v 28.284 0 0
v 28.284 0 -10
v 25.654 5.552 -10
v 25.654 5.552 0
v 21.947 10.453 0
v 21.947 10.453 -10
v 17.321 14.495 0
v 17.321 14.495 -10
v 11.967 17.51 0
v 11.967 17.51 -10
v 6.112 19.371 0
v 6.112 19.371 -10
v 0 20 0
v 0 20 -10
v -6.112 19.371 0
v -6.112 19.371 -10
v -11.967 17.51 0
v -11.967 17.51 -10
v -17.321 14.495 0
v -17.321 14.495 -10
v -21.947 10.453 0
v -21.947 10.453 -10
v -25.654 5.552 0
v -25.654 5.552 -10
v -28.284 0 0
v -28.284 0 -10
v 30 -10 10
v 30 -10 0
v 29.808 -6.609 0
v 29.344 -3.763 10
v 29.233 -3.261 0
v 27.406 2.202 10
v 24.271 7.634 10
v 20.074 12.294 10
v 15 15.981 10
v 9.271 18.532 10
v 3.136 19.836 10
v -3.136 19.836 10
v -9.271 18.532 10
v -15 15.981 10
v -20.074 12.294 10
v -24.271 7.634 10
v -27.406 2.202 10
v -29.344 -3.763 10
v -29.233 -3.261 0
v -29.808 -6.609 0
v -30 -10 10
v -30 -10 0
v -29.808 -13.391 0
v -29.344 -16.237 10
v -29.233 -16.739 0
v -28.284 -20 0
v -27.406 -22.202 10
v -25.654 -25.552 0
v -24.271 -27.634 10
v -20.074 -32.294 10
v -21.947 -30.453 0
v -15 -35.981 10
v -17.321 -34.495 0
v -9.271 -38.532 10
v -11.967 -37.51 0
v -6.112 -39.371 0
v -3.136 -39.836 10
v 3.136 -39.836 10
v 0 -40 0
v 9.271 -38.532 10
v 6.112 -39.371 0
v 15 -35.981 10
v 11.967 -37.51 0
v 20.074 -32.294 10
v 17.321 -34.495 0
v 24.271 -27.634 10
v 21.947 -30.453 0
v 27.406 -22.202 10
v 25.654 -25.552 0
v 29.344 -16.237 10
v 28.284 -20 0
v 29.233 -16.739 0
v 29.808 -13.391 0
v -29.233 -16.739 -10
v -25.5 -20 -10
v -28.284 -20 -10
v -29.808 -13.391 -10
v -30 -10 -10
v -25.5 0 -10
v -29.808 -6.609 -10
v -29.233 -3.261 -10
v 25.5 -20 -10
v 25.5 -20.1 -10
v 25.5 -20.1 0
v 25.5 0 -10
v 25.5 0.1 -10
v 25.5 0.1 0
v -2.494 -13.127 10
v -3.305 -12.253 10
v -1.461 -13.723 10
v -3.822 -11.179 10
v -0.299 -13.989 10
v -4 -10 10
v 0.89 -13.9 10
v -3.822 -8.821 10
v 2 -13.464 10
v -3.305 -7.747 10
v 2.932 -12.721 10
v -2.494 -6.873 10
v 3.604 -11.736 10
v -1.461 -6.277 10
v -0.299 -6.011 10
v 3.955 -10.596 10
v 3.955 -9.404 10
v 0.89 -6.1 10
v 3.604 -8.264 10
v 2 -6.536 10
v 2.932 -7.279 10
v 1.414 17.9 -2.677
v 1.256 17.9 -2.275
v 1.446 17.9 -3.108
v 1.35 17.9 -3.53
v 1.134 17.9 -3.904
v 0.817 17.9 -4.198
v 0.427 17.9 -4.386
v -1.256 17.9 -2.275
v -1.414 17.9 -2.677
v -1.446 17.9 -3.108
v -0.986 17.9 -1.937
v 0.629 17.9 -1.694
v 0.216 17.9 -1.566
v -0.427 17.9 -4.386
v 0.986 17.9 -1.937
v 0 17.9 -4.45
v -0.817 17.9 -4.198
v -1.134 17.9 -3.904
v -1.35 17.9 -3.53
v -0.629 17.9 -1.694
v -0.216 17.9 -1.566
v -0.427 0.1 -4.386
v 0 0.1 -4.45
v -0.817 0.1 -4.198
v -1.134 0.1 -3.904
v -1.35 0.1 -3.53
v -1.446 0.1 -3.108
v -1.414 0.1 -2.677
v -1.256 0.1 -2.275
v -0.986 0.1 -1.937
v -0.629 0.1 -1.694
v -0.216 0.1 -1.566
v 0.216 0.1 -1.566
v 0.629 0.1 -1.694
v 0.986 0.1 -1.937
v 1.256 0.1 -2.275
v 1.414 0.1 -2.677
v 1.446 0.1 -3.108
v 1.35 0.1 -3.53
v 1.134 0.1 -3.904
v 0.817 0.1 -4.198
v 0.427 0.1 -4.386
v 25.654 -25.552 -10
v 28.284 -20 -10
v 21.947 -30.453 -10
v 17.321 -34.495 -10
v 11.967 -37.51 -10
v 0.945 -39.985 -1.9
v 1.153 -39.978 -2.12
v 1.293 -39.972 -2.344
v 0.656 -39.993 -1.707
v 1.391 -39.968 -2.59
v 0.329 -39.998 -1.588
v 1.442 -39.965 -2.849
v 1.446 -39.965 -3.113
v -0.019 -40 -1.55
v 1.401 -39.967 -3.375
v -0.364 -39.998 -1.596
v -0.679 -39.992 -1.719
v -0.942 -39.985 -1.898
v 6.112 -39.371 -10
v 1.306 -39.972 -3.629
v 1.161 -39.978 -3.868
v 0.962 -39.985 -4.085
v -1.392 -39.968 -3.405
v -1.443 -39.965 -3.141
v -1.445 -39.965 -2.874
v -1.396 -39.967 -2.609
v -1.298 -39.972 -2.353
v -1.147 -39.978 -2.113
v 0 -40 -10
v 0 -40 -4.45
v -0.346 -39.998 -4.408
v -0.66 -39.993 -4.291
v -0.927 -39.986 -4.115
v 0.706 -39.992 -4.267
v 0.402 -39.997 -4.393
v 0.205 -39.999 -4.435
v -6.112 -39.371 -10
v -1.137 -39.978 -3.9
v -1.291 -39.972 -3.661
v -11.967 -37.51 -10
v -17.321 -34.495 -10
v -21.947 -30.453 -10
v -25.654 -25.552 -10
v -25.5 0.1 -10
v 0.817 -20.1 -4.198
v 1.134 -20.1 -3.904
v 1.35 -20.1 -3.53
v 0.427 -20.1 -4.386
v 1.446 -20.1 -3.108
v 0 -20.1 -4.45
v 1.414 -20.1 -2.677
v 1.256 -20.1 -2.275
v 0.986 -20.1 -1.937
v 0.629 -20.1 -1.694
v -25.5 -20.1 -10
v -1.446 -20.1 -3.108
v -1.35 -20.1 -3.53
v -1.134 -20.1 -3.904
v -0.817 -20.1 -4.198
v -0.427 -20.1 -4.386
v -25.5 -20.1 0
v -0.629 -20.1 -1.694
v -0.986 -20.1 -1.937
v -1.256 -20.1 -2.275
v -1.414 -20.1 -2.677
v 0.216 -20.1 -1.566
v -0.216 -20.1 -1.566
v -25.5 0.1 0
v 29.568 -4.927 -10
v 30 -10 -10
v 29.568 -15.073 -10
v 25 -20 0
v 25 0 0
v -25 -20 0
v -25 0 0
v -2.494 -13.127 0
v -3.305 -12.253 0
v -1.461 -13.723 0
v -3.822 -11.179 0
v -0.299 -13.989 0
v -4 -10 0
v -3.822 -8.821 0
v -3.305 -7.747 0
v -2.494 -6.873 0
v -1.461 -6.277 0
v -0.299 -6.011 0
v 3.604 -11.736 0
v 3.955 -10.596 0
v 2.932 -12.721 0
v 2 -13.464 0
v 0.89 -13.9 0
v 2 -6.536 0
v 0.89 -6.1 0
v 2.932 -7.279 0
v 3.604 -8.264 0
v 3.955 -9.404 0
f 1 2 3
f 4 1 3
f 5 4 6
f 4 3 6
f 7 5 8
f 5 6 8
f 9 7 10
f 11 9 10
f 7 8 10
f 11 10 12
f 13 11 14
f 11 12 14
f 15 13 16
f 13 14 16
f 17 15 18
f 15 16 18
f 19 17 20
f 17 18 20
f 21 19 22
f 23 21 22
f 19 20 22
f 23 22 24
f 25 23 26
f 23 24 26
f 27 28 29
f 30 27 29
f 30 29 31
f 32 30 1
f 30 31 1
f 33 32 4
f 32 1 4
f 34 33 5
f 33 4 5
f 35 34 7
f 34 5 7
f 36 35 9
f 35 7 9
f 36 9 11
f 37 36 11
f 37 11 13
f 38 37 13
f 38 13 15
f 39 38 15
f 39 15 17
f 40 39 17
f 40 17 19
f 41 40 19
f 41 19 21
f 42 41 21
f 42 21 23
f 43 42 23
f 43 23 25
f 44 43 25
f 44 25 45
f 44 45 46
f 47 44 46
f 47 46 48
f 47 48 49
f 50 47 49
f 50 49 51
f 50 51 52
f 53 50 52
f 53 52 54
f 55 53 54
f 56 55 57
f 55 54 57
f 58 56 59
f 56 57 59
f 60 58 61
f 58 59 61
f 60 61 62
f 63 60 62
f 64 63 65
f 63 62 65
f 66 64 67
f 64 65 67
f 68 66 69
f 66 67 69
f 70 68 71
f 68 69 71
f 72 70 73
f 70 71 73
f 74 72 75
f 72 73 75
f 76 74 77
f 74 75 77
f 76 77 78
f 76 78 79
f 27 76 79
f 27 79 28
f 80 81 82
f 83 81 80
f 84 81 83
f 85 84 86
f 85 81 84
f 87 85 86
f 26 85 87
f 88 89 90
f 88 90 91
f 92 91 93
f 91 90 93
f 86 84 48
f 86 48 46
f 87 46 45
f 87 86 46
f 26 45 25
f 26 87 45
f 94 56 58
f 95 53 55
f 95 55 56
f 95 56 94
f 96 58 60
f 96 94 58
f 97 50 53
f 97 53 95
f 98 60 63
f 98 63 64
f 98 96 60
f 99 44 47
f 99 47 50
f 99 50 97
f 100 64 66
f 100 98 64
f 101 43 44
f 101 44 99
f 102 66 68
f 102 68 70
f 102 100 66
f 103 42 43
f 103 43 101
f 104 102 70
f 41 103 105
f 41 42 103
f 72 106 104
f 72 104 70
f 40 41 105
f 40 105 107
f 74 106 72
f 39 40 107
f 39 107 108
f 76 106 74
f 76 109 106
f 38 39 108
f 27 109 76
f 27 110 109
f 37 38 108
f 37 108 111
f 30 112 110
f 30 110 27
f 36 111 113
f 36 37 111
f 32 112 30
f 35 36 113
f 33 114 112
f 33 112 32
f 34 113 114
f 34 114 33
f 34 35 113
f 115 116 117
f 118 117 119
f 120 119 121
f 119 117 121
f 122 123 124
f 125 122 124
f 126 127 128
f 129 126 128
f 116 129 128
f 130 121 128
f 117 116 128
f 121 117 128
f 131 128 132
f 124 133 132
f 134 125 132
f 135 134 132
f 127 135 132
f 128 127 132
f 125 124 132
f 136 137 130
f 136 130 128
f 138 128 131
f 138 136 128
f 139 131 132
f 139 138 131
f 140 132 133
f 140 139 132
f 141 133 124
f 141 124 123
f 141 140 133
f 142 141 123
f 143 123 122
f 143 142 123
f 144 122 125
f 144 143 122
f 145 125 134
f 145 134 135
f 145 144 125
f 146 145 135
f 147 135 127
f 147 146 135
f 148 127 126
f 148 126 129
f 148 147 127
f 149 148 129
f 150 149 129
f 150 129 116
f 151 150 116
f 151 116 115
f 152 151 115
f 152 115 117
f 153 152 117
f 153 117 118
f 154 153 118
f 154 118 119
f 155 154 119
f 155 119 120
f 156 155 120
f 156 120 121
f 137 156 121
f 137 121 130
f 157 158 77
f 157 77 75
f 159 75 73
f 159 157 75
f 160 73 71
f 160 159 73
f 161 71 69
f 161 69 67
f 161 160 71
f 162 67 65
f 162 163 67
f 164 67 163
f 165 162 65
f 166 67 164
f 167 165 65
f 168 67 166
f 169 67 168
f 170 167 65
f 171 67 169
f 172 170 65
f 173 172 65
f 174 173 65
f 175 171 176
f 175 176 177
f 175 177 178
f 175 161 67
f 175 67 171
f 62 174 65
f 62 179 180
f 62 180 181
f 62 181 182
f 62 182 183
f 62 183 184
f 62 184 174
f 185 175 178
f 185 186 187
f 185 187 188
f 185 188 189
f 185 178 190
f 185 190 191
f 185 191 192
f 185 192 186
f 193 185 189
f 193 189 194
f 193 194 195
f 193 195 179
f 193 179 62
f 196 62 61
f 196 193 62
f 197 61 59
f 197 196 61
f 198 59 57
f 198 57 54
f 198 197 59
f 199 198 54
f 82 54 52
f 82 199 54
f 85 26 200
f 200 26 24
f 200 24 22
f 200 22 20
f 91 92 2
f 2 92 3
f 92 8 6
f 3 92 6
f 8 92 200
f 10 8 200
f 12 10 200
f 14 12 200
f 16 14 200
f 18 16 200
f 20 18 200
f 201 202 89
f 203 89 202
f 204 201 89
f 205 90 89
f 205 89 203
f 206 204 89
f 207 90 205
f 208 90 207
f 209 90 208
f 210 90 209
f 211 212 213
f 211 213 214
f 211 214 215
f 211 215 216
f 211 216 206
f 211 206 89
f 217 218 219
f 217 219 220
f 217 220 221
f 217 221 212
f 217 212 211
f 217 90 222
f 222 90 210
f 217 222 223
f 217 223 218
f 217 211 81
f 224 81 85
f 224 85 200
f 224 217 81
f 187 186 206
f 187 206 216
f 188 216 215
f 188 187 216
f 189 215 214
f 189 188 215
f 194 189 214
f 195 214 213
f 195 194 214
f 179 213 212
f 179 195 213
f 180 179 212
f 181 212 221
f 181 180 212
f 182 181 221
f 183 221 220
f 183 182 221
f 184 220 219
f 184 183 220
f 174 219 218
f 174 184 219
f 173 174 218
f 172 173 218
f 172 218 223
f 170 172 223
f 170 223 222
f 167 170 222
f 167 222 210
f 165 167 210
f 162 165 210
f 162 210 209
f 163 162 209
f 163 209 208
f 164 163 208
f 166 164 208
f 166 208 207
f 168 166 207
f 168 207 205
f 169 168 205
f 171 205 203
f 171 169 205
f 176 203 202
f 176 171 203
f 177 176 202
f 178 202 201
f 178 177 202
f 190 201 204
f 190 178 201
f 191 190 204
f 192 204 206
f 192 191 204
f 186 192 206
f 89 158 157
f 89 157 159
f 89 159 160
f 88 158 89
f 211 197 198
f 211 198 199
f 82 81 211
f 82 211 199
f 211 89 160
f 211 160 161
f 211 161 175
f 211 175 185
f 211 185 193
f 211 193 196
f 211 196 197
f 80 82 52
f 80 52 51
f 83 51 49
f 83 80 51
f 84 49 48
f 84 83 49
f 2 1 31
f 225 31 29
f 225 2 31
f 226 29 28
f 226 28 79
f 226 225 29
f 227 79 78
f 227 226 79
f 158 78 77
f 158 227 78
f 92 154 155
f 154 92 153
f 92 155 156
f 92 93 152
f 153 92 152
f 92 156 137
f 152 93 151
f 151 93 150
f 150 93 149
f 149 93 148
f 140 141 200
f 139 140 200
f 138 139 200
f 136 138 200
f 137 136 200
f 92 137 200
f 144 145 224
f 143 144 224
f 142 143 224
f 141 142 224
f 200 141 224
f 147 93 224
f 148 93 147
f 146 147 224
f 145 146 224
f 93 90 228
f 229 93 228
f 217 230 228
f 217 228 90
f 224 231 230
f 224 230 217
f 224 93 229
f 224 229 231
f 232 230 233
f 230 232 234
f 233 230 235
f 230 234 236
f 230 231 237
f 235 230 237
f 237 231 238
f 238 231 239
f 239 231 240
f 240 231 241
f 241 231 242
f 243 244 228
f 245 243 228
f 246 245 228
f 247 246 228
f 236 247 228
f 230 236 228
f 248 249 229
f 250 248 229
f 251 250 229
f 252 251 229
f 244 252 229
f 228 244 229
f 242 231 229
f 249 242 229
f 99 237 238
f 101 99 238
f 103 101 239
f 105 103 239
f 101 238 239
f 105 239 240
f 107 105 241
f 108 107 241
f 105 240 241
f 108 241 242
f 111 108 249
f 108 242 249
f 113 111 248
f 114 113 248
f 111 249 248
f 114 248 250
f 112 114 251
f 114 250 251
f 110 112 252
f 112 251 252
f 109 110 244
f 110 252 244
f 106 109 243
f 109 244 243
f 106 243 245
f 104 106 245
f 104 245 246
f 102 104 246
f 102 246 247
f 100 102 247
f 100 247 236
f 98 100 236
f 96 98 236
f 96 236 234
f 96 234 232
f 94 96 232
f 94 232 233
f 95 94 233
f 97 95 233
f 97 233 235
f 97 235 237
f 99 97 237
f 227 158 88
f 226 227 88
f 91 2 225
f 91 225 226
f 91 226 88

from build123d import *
from build123d.topology import SkipClean

# Parameters (mm, degrees)
SKETCH_1_R               = 30
EXTRUDE_1_DEPTH          = 10
EXTRUDE_START            = 10
EXTRUDE_2_DEPTH          = 10
EXTRUDE_3_DEPTH          = 10
SKETCH_4_W               = 51
SKETCH_4_H               = 20.2
CUT_EXTRUDE_1_DEPTH      = 22
CUT_EXTRUDE_2_DEPTH      = 38
CUT_EXTRUDE_2_DEPTH_BACK = 29
SKETCH_5_R               = 1.45
SKETCH_8_R               = 4
CUT_EXTRUDE_5_DEPTH      = 57


with BuildPart() as part:
    # 草图1 → 凸台-拉伸1 (new body)
    with BuildSketch(Plane.XY):
        with Locations((0, -10)):
            Circle(SKETCH_1_R)
    extrude(amount=EXTRUDE_1_DEPTH)

    # 草图2 → 凸台-拉伸2 (add)
    with BuildSketch(Plane(origin=(0, 0, 0), x_dir=(-1, 0, 0), z_dir=(0, 0, -1)).offset(EXTRUDE_START)):
        with BuildLine():
            Line((28.284271247, 0), (-28.284271247, 0))
            ThreePointArc((-28.284271247, 0), (0, 20), (28.284271247, 0))
        make_face()
        with BuildLine():
            Line((28.284271247, -20), (-28.284271247, -20))
            ThreePointArc((-28.284271247, -20), (0, -40), (28.284271247, -20))
        make_face()
    extrude(amount=-EXTRUDE_2_DEPTH)

    # 草图3 → 凸台-拉伸3 (add)
    with SkipClean():  # the faces are left unmerged after this step: merging them gives an invalid solid
        with BuildSketch(Plane(origin=(0, 0, -10), x_dir=(-1, 0, 0), z_dir=(0, 0, -1))):
            with BuildLine():
                Line((-28.284271247, -20), (-25, -20))
                Line((-25, -20), (-25, 0))
                Line((-25, 0), (-28.284271247, 0))
                ThreePointArc((-28.284271247, 0), (-30, -10), (-28.284271247, -20))
            make_face()
            with BuildLine():
                Line((28.284271247, 0), (25, 0))
                Line((25, 0), (25, -20))
                Line((25, -20), (28.284271247, -20))
                ThreePointArc((28.284271247, -20), (29.56795679, -15.073059362), (30, -10))
                ThreePointArc((30, -10), (29.56795679, -4.926940638), (28.284271247, 0))
            make_face()
        extrude(amount=-EXTRUDE_3_DEPTH)

    # 草图4 → 切除-拉伸1 (cut)
    with SkipClean():  # the faces are left unmerged after this step: merging them gives an invalid solid
        with BuildSketch(Plane(origin=(0, 0, 0), x_dir=(-1, 0, 0), z_dir=(0, 0, -1))):
            with Locations((0, -10)):
                Rectangle(SKETCH_4_W, SKETCH_4_H)
        extrude(amount=CUT_EXTRUDE_1_DEPTH, mode=Mode.SUBTRACT)

    # 草图5 → 切除-拉伸2 (cut, two sides: drawn at the far end of the back side and taken through both)
    with SkipClean():  # the faces are left unmerged after this step: merging them gives an invalid solid
        with BuildSketch(Plane(origin=(0, -20.1, 0), x_dir=(1, 0, 0), z_dir=(0, 1, 0)).offset(-CUT_EXTRUDE_2_DEPTH_BACK)):
            with Locations(Location((0, 3, 0), (0, 0, 90))):
                Circle(SKETCH_5_R)
        extrude(amount=CUT_EXTRUDE_2_DEPTH + CUT_EXTRUDE_2_DEPTH_BACK, mode=Mode.SUBTRACT)

    # 草图8 → 切除-拉伸5 (cut)
    with SkipClean():  # the faces are left unmerged after this step: merging them gives an invalid solid
        with BuildSketch(Plane(origin=(0, 0, 0), x_dir=(-1, 0, 0), z_dir=(0, 0, -1))):
            with Locations((0, -10)):
                Circle(SKETCH_8_R)
        extrude(amount=-CUT_EXTRUDE_5_DEPTH, mode=Mode.SUBTRACT)


solid = part.part
